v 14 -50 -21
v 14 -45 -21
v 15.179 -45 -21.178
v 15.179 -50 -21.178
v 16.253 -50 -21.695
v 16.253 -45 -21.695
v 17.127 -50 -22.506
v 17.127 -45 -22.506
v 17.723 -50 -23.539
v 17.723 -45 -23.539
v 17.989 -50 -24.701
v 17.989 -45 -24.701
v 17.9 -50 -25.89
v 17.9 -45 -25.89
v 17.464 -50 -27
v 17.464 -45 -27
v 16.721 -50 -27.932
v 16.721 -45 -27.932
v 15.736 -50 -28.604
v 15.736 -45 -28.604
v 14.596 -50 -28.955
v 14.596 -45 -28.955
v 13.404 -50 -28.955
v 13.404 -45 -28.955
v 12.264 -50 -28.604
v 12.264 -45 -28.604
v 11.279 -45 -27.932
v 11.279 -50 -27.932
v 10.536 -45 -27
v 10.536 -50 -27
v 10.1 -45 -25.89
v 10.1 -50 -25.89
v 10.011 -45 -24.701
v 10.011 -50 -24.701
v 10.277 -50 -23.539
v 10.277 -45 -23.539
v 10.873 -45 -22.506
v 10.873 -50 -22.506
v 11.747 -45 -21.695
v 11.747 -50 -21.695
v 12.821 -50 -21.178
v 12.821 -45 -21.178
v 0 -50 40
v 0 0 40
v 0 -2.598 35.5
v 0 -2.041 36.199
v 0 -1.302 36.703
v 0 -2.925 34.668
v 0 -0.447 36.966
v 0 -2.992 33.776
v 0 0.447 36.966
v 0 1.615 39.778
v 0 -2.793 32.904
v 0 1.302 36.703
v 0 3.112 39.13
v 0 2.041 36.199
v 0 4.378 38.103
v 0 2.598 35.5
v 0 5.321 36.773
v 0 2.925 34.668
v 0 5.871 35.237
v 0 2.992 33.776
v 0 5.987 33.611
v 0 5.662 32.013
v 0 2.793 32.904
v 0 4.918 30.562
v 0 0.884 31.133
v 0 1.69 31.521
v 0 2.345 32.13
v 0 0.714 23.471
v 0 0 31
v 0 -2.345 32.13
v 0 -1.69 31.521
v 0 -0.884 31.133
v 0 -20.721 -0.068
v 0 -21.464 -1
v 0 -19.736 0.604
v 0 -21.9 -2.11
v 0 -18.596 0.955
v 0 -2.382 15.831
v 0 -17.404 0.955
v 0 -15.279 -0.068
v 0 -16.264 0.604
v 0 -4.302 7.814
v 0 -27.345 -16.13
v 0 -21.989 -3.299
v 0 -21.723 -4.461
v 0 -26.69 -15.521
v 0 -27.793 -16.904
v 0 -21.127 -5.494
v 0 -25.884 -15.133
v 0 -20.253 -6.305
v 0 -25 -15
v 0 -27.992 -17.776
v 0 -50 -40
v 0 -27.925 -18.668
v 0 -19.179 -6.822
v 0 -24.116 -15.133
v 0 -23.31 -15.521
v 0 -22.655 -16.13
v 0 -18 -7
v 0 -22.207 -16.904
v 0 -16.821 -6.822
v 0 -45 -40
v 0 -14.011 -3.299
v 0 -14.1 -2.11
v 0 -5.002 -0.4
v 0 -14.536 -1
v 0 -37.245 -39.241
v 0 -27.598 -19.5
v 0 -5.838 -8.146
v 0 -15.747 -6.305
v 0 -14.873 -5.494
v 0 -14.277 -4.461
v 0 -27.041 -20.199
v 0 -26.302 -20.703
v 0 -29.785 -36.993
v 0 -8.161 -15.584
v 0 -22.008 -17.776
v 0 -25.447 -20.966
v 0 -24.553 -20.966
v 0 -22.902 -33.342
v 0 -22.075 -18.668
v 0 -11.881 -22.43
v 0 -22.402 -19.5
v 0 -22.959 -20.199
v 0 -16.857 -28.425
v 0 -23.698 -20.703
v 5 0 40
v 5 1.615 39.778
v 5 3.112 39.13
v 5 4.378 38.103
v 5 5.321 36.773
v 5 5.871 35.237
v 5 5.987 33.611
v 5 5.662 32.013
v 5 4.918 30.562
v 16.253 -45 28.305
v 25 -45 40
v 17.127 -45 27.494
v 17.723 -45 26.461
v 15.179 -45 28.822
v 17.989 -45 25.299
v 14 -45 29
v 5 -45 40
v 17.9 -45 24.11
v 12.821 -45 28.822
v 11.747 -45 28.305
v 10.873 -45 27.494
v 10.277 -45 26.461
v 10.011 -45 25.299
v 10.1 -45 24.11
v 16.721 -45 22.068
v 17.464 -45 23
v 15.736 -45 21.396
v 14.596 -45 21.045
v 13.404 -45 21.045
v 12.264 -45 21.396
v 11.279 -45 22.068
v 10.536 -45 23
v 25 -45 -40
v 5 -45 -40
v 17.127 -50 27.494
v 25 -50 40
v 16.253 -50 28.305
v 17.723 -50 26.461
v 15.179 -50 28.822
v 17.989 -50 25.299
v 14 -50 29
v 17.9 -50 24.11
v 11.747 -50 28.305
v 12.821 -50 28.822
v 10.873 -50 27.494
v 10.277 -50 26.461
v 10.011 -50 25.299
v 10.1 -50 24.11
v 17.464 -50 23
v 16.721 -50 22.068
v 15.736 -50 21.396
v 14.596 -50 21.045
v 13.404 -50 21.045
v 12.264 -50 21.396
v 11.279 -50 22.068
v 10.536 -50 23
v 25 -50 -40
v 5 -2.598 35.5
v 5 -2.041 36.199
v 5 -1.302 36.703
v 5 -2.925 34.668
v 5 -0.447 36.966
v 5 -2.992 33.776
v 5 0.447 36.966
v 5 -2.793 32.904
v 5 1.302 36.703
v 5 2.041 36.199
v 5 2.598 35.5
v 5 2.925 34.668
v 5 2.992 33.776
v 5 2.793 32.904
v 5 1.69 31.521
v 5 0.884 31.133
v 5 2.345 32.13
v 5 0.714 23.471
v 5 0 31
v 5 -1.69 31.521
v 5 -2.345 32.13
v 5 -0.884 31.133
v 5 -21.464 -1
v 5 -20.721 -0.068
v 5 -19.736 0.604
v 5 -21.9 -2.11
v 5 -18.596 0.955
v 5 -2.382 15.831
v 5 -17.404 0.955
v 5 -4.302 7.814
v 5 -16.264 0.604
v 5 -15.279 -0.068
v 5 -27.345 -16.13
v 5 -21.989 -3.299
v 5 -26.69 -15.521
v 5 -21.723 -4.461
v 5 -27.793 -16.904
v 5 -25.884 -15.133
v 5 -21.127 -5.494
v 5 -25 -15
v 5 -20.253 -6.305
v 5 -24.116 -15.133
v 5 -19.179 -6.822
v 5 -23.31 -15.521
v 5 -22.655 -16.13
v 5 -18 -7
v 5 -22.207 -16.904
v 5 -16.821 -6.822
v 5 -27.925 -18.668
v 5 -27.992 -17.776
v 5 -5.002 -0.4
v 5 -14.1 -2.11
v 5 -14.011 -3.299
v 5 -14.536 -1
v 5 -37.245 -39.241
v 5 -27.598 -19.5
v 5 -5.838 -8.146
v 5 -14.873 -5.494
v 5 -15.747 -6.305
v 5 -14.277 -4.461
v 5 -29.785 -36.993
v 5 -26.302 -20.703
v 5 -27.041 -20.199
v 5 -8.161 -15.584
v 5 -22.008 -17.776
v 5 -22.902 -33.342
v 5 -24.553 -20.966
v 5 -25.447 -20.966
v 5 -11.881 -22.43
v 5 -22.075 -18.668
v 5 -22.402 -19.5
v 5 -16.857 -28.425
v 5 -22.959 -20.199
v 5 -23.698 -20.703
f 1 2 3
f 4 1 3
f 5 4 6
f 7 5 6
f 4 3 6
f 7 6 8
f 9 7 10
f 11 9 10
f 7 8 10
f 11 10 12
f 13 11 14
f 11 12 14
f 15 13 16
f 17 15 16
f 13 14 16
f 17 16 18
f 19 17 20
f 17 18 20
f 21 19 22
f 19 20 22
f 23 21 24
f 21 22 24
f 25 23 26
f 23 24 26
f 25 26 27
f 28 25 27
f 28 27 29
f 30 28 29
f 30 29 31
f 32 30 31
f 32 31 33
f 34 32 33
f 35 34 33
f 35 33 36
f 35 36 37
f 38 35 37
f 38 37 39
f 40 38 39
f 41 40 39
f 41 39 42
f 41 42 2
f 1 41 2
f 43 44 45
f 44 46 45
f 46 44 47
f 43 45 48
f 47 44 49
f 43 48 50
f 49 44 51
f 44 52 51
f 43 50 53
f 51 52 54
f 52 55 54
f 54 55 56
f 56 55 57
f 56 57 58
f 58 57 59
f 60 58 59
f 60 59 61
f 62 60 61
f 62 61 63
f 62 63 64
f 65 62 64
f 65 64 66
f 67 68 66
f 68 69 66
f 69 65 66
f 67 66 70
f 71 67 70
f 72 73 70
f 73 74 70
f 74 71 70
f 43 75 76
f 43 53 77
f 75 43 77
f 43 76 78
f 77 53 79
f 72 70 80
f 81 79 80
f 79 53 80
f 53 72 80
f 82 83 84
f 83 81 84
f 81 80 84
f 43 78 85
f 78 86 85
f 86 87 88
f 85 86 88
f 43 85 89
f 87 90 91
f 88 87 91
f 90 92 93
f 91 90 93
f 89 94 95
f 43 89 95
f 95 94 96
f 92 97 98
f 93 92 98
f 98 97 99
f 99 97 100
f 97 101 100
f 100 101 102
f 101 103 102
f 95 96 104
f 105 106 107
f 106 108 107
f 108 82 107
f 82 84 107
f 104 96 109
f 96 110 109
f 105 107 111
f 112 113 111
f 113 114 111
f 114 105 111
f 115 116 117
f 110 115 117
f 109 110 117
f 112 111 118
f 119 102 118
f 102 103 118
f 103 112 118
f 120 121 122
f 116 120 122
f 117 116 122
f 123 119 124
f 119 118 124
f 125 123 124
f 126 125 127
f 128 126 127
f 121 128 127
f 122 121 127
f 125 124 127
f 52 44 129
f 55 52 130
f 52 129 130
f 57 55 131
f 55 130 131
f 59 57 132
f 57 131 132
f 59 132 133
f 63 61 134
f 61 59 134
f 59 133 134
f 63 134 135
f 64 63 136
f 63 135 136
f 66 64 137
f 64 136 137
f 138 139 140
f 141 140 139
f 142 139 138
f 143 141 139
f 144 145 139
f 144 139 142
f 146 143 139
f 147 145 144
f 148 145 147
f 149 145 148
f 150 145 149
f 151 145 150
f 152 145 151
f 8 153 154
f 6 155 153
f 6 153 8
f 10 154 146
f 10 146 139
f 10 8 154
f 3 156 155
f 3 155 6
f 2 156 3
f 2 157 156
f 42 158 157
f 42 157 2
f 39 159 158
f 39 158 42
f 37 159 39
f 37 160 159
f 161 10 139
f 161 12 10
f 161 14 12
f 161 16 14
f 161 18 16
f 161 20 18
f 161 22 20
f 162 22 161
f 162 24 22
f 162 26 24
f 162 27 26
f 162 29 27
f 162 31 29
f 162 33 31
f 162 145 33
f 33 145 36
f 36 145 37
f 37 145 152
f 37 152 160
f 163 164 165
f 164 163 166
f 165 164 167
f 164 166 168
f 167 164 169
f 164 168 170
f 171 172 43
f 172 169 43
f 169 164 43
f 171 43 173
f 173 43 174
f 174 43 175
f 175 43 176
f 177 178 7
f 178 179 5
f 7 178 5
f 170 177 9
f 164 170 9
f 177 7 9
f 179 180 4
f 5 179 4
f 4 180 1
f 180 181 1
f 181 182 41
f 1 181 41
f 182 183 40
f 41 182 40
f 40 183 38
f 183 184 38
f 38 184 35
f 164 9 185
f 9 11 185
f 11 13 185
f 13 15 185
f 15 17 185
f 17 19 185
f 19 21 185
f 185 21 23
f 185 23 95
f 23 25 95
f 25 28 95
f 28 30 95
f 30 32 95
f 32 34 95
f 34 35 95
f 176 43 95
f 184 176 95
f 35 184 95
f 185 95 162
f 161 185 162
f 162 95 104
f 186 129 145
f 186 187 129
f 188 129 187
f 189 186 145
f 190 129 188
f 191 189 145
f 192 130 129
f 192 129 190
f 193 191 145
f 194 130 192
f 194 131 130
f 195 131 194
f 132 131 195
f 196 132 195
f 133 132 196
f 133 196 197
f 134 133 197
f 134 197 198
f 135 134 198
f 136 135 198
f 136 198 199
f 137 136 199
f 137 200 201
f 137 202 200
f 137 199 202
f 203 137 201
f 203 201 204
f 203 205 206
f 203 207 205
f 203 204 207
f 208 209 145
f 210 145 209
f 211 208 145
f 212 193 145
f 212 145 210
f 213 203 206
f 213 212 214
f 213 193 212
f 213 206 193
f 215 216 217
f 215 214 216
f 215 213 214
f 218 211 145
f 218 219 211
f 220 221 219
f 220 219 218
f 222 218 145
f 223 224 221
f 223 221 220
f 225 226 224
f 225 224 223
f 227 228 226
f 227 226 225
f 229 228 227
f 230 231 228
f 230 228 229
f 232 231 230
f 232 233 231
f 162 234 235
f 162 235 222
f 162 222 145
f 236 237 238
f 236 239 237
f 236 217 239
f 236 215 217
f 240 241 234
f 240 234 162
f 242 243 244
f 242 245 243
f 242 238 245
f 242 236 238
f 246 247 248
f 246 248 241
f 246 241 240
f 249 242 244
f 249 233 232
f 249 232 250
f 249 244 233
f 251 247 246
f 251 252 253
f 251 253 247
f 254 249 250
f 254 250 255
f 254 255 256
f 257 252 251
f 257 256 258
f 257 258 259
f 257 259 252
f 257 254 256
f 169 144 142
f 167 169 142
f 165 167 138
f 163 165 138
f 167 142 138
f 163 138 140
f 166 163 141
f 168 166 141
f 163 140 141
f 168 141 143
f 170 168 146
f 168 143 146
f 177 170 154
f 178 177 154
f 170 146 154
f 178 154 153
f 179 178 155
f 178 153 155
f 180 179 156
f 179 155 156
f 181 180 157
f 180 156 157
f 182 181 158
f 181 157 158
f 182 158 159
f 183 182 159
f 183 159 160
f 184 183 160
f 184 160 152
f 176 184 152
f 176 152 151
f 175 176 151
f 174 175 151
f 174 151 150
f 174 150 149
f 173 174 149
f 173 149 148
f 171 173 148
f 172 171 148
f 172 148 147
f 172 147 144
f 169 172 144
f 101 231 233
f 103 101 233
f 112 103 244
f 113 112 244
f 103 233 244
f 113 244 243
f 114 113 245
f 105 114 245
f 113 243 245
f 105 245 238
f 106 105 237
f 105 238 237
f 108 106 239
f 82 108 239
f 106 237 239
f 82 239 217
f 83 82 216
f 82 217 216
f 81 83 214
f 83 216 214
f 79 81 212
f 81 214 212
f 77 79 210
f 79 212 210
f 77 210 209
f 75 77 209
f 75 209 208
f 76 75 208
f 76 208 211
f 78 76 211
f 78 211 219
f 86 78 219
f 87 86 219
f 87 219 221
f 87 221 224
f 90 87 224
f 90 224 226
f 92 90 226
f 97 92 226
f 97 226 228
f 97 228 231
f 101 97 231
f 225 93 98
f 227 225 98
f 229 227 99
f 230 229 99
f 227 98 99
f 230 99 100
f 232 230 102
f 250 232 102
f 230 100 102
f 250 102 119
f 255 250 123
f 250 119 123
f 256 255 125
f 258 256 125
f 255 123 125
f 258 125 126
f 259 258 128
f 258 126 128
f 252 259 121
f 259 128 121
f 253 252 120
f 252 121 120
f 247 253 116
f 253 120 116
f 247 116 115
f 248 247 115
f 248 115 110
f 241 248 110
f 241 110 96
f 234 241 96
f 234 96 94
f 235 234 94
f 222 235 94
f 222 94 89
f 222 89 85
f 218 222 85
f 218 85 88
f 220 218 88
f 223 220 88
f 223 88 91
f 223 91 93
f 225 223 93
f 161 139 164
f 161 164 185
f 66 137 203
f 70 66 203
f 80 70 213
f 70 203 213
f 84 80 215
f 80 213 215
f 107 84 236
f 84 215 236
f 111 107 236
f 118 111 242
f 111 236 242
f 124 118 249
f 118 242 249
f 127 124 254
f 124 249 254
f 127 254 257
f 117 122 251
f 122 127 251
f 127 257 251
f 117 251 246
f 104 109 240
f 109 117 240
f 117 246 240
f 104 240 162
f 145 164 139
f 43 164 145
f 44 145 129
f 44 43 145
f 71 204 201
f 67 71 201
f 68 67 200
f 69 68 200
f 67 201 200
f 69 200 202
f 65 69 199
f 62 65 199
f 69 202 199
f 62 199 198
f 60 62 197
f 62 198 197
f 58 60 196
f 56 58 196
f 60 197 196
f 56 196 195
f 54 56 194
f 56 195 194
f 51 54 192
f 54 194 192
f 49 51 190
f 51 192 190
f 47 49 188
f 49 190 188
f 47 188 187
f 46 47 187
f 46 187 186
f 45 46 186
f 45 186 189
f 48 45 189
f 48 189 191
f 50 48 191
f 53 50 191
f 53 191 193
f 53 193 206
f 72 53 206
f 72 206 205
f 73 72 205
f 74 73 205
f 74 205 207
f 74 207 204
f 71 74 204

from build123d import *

# Parameters (mm, degrees)
SKETCH1_W           = 80
SKETCH1_H           = 100
BOSS_EXTRUDE1_DEPTH = 5
SKETCH2_W           = 80
SKETCH2_H           = 5
BOSS_EXTRUDE2_DEPTH = 20
SKETCH3_R           = 4
CUT_EXTRUDE1_DEPTH  = 107.066017178
SKETCH4_R           = 4
CUT_EXTRUDE2_DEPTH  = 68.082039325
SKETCH5_R           = 3
CUT_EXTRUDE4_DEPTH  = 68.082039325
SKETCH7_R           = 3
CUT_EXTRUDE5_DEPTH  = 10


with BuildPart() as part:
    # Sketch1 → Boss-Extrude1 (new body)
    with BuildSketch(Plane(origin=(0, 0, 0), x_dir=(0, 0, -1), z_dir=(1, 0, 0))):
        Rectangle(SKETCH1_W, SKETCH1_H)
    extrude(amount=BOSS_EXTRUDE1_DEPTH)

    # Sketch2 → Boss-Extrude2 (add)
    with BuildSketch(Plane(origin=(5, 0, 0), x_dir=(0, 0, -1), z_dir=(1, 0, 0))):
        with Locations((0, -47.5)):
            Rectangle(SKETCH2_W, SKETCH2_H)
    extrude(amount=BOSS_EXTRUDE2_DEPTH)

    # Sketch3 → Cut-Extrude1 (cut, through all)
    with BuildSketch(Plane(origin=(0, -45, 0), x_dir=(1, 0, 0), z_dir=(0, 1, 0))):
        with Locations(Location((14, 25, 0), (0, 0, 270))):
            Circle(SKETCH3_R)
        with Locations(Location((14, -25, 0), (0, 0, 270))):
            Circle(SKETCH3_R)
    extrude(amount=-CUT_EXTRUDE1_DEPTH, mode=Mode.SUBTRACT)

    # Sketch4 → Cut-Extrude2 (cut, through all)
    with BuildSketch(Plane(origin=(5, 0, 0), x_dir=(0, 0, -1), z_dir=(1, 0, 0))):
        with Locations((3, -18)):
            Circle(SKETCH4_R)
    extrude(amount=-CUT_EXTRUDE2_DEPTH, mode=Mode.SUBTRACT)

    # Sketch5 → Cut-Extrude4 (cut, through all)
    with BuildSketch(Plane(origin=(5, 0, 0), x_dir=(0, 0, -1), z_dir=(1, 0, 0))):
        with BuildLine():
            Line((-40, 50), (-40, 0))
            ThreePointArc((-40, 0), (-36.772544511, 5.320995859), (-30.562334356, 4.917565955))
            ThreePointArc((-30.562334356, 4.917565955), (-15.830972977, -2.382340063), (0.39983188, -5.001998369))
            ThreePointArc((0.39983188, -5.001998369), (28.425281663, -16.857445702), (40, -45))
            Line((40, -45), (40, 50))
            Line((40, 50), (-40, 50))
        make_face()
        with Locations((-34, 0)):
            Circle(SKETCH5_R)
    extrude(amount=-CUT_EXTRUDE4_DEPTH, mode=Mode.SUBTRACT)

    # Sketch7 → Cut-Extrude5 (cut)
    with BuildSketch(Plane.ZY):
        with Locations((-18, -25)):
            Circle(SKETCH7_R)
    extrude(amount=-CUT_EXTRUDE5_DEPTH, mode=Mode.SUBTRACT)


solid = part.part
